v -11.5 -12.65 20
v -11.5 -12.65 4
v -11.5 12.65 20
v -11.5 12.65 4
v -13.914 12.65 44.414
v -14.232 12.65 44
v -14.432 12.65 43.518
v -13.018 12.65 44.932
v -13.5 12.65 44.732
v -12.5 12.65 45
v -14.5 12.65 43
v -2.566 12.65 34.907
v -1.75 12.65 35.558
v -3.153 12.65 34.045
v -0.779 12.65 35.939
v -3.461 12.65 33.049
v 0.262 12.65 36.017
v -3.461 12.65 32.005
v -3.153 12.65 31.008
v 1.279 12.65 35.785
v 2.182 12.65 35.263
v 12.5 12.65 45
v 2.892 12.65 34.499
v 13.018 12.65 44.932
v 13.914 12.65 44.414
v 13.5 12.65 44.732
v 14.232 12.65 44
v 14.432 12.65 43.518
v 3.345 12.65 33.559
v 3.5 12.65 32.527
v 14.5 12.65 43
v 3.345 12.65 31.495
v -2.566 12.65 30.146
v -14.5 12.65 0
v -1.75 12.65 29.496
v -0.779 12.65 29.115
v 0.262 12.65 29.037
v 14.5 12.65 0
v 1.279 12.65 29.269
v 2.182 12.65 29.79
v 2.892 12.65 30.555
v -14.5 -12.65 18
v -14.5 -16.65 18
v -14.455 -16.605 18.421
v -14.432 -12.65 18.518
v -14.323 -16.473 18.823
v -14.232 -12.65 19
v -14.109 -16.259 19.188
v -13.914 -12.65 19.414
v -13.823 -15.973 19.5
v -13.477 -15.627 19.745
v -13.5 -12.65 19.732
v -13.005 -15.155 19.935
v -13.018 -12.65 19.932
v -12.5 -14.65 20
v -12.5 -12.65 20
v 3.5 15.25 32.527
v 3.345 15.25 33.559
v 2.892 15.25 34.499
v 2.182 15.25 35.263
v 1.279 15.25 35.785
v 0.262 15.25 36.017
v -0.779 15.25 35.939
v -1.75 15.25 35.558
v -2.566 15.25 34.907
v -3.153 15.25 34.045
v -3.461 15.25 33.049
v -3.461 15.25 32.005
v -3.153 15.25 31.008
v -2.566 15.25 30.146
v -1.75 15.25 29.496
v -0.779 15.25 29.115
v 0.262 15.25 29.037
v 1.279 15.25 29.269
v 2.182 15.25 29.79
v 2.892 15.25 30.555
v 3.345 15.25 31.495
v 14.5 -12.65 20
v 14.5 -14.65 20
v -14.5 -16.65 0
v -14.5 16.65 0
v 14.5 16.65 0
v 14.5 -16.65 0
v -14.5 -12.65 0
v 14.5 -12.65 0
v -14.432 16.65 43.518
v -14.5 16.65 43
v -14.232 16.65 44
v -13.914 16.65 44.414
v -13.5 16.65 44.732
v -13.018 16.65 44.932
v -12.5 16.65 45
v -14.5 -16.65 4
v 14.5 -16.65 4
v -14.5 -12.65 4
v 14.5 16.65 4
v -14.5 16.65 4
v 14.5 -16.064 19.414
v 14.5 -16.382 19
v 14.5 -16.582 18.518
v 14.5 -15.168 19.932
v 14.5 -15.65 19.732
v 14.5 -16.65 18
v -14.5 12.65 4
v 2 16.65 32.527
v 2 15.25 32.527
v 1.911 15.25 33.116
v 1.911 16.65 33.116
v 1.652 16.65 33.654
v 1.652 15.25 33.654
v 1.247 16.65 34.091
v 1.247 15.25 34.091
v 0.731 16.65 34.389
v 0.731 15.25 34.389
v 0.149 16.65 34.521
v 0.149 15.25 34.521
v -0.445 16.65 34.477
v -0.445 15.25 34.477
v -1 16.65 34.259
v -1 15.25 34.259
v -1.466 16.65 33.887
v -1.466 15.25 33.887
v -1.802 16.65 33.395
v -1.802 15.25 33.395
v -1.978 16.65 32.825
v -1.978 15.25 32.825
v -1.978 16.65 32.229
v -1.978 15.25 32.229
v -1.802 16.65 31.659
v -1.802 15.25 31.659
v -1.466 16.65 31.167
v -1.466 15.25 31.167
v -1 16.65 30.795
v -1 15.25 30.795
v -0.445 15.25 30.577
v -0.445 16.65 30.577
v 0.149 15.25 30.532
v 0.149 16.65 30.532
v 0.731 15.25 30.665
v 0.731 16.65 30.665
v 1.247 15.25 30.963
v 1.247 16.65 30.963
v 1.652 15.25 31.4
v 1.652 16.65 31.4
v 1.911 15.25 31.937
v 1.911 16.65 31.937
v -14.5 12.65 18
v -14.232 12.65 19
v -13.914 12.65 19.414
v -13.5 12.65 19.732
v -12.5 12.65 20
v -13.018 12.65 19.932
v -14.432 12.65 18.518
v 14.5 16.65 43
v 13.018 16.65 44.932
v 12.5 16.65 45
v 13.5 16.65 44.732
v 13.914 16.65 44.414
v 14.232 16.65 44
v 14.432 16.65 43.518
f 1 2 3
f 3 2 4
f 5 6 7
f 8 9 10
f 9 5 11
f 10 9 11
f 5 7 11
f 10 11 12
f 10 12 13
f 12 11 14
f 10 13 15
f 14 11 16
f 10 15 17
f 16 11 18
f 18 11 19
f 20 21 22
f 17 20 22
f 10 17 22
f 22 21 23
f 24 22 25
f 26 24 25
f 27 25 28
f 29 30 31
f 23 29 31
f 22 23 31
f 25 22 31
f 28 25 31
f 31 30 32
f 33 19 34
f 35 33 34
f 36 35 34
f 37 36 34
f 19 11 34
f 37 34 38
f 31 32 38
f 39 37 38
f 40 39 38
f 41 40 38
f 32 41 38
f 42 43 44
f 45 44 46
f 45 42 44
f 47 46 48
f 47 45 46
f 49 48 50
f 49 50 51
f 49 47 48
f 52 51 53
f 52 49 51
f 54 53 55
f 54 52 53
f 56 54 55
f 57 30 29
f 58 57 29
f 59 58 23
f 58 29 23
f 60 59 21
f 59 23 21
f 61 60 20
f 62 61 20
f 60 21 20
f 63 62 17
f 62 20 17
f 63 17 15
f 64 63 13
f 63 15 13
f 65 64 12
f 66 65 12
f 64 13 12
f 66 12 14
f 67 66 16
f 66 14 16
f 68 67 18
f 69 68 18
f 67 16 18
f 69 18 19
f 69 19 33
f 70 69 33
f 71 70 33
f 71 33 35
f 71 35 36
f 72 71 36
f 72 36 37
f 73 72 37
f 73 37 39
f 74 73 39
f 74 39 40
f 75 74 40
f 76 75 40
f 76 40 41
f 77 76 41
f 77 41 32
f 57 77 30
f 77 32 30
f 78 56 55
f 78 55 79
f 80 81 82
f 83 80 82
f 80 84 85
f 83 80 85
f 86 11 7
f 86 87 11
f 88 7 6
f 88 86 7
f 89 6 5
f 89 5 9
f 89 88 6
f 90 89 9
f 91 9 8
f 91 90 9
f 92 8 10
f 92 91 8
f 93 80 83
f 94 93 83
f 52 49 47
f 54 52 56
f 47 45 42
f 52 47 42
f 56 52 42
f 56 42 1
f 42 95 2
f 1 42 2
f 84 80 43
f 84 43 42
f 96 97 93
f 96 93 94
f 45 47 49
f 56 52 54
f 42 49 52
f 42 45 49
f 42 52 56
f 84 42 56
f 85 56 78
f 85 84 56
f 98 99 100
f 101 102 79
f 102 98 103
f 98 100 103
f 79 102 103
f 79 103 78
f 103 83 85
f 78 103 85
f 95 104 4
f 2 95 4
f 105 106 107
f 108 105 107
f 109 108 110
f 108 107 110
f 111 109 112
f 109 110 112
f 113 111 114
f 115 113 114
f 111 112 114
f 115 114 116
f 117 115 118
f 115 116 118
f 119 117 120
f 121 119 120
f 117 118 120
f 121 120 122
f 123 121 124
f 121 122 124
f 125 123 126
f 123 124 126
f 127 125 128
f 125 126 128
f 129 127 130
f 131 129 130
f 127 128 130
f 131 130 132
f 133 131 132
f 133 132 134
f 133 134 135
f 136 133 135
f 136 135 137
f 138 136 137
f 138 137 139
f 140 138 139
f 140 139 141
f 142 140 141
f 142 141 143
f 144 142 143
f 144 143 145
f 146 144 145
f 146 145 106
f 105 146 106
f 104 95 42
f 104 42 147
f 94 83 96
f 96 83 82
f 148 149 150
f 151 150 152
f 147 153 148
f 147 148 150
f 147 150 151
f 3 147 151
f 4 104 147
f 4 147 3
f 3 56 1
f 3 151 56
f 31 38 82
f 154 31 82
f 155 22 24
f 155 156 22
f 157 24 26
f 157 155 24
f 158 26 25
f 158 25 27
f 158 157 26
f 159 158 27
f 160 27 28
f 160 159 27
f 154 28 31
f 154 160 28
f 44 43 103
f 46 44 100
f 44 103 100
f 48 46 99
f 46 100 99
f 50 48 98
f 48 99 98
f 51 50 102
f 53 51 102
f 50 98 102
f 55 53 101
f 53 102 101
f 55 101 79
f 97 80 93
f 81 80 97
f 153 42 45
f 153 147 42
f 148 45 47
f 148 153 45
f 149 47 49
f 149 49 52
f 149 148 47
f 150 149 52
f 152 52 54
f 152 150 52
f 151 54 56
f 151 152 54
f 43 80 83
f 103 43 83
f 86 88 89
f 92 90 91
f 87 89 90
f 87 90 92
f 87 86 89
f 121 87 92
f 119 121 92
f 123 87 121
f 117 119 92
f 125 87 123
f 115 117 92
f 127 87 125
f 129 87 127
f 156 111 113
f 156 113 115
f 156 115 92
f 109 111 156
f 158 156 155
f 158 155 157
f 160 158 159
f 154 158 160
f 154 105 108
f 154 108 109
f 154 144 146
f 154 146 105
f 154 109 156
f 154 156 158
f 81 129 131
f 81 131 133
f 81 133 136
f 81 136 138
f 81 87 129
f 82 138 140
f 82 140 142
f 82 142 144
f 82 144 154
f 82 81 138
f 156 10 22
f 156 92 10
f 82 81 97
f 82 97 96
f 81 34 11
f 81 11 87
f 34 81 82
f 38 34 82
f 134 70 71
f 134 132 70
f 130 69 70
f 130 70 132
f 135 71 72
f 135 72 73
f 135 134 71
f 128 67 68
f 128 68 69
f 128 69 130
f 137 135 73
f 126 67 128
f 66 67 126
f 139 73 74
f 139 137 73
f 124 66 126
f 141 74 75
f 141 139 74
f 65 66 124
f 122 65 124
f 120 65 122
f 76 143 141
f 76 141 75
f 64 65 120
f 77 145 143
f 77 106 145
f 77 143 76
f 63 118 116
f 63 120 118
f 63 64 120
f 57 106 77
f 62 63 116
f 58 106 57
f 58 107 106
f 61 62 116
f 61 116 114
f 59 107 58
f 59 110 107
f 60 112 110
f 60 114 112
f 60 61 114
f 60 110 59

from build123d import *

# Parameters (mm, degrees)
F0_W      = 29
F0_H      = 33.3
F1_DEPTH  = 4
F2_W      = 29
F2_H      = 4
F3_DEPTH  = 45
F4_W      = 29
F4_H      = 4
F5_DEPTH  = 20
F6_R      = 2
F7_DEPTH  = 6
F8_R      = 3.5
F9_DEPTH  = 2.6
F10_R     = 2
F11_W     = 3
F11_H     = 25.3
F12_DEPTH = 16
F13_R     = 2
F13_2_R   = 2


with BuildPart() as f1:
    # F0 (on Top) → F1 (new body)
    with BuildSketch(Plane.XY):
        Rectangle(F0_W, F0_H)
    extrude(amount=F1_DEPTH)


with BuildPart() as f3:
    # F2 (on face) → F3 (new body)
    with BuildSketch(Plane.XY):
        with Locations((0, 14.65)):
            Rectangle(F2_W, F2_H)
    extrude(amount=F3_DEPTH)

    # F6 (on face) → F7 (cut)
    with BuildSketch(Plane.XZ.offset(-12.65)):
        with Locations((0, 32.526892)):
            Circle(F6_R)
    extrude(amount=-F7_DEPTH, mode=Mode.SUBTRACT)

    # F8 (on face) → F9 (cut)
    with BuildSketch(Plane.XZ.offset(-12.65)):
        with Locations((0, 32.526892)):
            Circle(F8_R)
    extrude(amount=-F9_DEPTH, mode=Mode.SUBTRACT)

    # F10
    f10_edges = [f3.edges().sort_by_distance(p)[0] for p in [
        (-14.5, 14.65, 45),
        (14.5, 14.65, 45),
    ]]
    fillet(f10_edges, radius=F10_R)


with BuildPart() as f5:
    # F4 (on face) → F5 (new body)
    with BuildSketch(Plane.XY):
        with Locations((0, -14.65)):
            Rectangle(F4_W, F4_H)
    extrude(amount=F5_DEPTH)

    # F13
    f13_edges = [f5.edges().sort_by_distance(p)[0] for p in [
        (0, -16.65, 20),
        (-14.5, -14.65, 20),
    ]]
    fillet(f13_edges, radius=F13_R)


with BuildPart() as f12:
    # F11 (on face) → F12 (new body)
    with BuildSketch(Plane.XY.offset(4)):
        with Locations((-13, 0)):
            Rectangle(F11_W, F11_H)
    extrude(amount=F12_DEPTH)

    # F13#2
    f13_2_edges = [f12.edges().sort_by_distance(p)[0] for p in [
        (-14.5, 0, 20),
    ]]
    fillet(f13_2_edges, radius=F13_2_R)


solid = Compound([f1.part, f3.part, f5.part, f12.part])
